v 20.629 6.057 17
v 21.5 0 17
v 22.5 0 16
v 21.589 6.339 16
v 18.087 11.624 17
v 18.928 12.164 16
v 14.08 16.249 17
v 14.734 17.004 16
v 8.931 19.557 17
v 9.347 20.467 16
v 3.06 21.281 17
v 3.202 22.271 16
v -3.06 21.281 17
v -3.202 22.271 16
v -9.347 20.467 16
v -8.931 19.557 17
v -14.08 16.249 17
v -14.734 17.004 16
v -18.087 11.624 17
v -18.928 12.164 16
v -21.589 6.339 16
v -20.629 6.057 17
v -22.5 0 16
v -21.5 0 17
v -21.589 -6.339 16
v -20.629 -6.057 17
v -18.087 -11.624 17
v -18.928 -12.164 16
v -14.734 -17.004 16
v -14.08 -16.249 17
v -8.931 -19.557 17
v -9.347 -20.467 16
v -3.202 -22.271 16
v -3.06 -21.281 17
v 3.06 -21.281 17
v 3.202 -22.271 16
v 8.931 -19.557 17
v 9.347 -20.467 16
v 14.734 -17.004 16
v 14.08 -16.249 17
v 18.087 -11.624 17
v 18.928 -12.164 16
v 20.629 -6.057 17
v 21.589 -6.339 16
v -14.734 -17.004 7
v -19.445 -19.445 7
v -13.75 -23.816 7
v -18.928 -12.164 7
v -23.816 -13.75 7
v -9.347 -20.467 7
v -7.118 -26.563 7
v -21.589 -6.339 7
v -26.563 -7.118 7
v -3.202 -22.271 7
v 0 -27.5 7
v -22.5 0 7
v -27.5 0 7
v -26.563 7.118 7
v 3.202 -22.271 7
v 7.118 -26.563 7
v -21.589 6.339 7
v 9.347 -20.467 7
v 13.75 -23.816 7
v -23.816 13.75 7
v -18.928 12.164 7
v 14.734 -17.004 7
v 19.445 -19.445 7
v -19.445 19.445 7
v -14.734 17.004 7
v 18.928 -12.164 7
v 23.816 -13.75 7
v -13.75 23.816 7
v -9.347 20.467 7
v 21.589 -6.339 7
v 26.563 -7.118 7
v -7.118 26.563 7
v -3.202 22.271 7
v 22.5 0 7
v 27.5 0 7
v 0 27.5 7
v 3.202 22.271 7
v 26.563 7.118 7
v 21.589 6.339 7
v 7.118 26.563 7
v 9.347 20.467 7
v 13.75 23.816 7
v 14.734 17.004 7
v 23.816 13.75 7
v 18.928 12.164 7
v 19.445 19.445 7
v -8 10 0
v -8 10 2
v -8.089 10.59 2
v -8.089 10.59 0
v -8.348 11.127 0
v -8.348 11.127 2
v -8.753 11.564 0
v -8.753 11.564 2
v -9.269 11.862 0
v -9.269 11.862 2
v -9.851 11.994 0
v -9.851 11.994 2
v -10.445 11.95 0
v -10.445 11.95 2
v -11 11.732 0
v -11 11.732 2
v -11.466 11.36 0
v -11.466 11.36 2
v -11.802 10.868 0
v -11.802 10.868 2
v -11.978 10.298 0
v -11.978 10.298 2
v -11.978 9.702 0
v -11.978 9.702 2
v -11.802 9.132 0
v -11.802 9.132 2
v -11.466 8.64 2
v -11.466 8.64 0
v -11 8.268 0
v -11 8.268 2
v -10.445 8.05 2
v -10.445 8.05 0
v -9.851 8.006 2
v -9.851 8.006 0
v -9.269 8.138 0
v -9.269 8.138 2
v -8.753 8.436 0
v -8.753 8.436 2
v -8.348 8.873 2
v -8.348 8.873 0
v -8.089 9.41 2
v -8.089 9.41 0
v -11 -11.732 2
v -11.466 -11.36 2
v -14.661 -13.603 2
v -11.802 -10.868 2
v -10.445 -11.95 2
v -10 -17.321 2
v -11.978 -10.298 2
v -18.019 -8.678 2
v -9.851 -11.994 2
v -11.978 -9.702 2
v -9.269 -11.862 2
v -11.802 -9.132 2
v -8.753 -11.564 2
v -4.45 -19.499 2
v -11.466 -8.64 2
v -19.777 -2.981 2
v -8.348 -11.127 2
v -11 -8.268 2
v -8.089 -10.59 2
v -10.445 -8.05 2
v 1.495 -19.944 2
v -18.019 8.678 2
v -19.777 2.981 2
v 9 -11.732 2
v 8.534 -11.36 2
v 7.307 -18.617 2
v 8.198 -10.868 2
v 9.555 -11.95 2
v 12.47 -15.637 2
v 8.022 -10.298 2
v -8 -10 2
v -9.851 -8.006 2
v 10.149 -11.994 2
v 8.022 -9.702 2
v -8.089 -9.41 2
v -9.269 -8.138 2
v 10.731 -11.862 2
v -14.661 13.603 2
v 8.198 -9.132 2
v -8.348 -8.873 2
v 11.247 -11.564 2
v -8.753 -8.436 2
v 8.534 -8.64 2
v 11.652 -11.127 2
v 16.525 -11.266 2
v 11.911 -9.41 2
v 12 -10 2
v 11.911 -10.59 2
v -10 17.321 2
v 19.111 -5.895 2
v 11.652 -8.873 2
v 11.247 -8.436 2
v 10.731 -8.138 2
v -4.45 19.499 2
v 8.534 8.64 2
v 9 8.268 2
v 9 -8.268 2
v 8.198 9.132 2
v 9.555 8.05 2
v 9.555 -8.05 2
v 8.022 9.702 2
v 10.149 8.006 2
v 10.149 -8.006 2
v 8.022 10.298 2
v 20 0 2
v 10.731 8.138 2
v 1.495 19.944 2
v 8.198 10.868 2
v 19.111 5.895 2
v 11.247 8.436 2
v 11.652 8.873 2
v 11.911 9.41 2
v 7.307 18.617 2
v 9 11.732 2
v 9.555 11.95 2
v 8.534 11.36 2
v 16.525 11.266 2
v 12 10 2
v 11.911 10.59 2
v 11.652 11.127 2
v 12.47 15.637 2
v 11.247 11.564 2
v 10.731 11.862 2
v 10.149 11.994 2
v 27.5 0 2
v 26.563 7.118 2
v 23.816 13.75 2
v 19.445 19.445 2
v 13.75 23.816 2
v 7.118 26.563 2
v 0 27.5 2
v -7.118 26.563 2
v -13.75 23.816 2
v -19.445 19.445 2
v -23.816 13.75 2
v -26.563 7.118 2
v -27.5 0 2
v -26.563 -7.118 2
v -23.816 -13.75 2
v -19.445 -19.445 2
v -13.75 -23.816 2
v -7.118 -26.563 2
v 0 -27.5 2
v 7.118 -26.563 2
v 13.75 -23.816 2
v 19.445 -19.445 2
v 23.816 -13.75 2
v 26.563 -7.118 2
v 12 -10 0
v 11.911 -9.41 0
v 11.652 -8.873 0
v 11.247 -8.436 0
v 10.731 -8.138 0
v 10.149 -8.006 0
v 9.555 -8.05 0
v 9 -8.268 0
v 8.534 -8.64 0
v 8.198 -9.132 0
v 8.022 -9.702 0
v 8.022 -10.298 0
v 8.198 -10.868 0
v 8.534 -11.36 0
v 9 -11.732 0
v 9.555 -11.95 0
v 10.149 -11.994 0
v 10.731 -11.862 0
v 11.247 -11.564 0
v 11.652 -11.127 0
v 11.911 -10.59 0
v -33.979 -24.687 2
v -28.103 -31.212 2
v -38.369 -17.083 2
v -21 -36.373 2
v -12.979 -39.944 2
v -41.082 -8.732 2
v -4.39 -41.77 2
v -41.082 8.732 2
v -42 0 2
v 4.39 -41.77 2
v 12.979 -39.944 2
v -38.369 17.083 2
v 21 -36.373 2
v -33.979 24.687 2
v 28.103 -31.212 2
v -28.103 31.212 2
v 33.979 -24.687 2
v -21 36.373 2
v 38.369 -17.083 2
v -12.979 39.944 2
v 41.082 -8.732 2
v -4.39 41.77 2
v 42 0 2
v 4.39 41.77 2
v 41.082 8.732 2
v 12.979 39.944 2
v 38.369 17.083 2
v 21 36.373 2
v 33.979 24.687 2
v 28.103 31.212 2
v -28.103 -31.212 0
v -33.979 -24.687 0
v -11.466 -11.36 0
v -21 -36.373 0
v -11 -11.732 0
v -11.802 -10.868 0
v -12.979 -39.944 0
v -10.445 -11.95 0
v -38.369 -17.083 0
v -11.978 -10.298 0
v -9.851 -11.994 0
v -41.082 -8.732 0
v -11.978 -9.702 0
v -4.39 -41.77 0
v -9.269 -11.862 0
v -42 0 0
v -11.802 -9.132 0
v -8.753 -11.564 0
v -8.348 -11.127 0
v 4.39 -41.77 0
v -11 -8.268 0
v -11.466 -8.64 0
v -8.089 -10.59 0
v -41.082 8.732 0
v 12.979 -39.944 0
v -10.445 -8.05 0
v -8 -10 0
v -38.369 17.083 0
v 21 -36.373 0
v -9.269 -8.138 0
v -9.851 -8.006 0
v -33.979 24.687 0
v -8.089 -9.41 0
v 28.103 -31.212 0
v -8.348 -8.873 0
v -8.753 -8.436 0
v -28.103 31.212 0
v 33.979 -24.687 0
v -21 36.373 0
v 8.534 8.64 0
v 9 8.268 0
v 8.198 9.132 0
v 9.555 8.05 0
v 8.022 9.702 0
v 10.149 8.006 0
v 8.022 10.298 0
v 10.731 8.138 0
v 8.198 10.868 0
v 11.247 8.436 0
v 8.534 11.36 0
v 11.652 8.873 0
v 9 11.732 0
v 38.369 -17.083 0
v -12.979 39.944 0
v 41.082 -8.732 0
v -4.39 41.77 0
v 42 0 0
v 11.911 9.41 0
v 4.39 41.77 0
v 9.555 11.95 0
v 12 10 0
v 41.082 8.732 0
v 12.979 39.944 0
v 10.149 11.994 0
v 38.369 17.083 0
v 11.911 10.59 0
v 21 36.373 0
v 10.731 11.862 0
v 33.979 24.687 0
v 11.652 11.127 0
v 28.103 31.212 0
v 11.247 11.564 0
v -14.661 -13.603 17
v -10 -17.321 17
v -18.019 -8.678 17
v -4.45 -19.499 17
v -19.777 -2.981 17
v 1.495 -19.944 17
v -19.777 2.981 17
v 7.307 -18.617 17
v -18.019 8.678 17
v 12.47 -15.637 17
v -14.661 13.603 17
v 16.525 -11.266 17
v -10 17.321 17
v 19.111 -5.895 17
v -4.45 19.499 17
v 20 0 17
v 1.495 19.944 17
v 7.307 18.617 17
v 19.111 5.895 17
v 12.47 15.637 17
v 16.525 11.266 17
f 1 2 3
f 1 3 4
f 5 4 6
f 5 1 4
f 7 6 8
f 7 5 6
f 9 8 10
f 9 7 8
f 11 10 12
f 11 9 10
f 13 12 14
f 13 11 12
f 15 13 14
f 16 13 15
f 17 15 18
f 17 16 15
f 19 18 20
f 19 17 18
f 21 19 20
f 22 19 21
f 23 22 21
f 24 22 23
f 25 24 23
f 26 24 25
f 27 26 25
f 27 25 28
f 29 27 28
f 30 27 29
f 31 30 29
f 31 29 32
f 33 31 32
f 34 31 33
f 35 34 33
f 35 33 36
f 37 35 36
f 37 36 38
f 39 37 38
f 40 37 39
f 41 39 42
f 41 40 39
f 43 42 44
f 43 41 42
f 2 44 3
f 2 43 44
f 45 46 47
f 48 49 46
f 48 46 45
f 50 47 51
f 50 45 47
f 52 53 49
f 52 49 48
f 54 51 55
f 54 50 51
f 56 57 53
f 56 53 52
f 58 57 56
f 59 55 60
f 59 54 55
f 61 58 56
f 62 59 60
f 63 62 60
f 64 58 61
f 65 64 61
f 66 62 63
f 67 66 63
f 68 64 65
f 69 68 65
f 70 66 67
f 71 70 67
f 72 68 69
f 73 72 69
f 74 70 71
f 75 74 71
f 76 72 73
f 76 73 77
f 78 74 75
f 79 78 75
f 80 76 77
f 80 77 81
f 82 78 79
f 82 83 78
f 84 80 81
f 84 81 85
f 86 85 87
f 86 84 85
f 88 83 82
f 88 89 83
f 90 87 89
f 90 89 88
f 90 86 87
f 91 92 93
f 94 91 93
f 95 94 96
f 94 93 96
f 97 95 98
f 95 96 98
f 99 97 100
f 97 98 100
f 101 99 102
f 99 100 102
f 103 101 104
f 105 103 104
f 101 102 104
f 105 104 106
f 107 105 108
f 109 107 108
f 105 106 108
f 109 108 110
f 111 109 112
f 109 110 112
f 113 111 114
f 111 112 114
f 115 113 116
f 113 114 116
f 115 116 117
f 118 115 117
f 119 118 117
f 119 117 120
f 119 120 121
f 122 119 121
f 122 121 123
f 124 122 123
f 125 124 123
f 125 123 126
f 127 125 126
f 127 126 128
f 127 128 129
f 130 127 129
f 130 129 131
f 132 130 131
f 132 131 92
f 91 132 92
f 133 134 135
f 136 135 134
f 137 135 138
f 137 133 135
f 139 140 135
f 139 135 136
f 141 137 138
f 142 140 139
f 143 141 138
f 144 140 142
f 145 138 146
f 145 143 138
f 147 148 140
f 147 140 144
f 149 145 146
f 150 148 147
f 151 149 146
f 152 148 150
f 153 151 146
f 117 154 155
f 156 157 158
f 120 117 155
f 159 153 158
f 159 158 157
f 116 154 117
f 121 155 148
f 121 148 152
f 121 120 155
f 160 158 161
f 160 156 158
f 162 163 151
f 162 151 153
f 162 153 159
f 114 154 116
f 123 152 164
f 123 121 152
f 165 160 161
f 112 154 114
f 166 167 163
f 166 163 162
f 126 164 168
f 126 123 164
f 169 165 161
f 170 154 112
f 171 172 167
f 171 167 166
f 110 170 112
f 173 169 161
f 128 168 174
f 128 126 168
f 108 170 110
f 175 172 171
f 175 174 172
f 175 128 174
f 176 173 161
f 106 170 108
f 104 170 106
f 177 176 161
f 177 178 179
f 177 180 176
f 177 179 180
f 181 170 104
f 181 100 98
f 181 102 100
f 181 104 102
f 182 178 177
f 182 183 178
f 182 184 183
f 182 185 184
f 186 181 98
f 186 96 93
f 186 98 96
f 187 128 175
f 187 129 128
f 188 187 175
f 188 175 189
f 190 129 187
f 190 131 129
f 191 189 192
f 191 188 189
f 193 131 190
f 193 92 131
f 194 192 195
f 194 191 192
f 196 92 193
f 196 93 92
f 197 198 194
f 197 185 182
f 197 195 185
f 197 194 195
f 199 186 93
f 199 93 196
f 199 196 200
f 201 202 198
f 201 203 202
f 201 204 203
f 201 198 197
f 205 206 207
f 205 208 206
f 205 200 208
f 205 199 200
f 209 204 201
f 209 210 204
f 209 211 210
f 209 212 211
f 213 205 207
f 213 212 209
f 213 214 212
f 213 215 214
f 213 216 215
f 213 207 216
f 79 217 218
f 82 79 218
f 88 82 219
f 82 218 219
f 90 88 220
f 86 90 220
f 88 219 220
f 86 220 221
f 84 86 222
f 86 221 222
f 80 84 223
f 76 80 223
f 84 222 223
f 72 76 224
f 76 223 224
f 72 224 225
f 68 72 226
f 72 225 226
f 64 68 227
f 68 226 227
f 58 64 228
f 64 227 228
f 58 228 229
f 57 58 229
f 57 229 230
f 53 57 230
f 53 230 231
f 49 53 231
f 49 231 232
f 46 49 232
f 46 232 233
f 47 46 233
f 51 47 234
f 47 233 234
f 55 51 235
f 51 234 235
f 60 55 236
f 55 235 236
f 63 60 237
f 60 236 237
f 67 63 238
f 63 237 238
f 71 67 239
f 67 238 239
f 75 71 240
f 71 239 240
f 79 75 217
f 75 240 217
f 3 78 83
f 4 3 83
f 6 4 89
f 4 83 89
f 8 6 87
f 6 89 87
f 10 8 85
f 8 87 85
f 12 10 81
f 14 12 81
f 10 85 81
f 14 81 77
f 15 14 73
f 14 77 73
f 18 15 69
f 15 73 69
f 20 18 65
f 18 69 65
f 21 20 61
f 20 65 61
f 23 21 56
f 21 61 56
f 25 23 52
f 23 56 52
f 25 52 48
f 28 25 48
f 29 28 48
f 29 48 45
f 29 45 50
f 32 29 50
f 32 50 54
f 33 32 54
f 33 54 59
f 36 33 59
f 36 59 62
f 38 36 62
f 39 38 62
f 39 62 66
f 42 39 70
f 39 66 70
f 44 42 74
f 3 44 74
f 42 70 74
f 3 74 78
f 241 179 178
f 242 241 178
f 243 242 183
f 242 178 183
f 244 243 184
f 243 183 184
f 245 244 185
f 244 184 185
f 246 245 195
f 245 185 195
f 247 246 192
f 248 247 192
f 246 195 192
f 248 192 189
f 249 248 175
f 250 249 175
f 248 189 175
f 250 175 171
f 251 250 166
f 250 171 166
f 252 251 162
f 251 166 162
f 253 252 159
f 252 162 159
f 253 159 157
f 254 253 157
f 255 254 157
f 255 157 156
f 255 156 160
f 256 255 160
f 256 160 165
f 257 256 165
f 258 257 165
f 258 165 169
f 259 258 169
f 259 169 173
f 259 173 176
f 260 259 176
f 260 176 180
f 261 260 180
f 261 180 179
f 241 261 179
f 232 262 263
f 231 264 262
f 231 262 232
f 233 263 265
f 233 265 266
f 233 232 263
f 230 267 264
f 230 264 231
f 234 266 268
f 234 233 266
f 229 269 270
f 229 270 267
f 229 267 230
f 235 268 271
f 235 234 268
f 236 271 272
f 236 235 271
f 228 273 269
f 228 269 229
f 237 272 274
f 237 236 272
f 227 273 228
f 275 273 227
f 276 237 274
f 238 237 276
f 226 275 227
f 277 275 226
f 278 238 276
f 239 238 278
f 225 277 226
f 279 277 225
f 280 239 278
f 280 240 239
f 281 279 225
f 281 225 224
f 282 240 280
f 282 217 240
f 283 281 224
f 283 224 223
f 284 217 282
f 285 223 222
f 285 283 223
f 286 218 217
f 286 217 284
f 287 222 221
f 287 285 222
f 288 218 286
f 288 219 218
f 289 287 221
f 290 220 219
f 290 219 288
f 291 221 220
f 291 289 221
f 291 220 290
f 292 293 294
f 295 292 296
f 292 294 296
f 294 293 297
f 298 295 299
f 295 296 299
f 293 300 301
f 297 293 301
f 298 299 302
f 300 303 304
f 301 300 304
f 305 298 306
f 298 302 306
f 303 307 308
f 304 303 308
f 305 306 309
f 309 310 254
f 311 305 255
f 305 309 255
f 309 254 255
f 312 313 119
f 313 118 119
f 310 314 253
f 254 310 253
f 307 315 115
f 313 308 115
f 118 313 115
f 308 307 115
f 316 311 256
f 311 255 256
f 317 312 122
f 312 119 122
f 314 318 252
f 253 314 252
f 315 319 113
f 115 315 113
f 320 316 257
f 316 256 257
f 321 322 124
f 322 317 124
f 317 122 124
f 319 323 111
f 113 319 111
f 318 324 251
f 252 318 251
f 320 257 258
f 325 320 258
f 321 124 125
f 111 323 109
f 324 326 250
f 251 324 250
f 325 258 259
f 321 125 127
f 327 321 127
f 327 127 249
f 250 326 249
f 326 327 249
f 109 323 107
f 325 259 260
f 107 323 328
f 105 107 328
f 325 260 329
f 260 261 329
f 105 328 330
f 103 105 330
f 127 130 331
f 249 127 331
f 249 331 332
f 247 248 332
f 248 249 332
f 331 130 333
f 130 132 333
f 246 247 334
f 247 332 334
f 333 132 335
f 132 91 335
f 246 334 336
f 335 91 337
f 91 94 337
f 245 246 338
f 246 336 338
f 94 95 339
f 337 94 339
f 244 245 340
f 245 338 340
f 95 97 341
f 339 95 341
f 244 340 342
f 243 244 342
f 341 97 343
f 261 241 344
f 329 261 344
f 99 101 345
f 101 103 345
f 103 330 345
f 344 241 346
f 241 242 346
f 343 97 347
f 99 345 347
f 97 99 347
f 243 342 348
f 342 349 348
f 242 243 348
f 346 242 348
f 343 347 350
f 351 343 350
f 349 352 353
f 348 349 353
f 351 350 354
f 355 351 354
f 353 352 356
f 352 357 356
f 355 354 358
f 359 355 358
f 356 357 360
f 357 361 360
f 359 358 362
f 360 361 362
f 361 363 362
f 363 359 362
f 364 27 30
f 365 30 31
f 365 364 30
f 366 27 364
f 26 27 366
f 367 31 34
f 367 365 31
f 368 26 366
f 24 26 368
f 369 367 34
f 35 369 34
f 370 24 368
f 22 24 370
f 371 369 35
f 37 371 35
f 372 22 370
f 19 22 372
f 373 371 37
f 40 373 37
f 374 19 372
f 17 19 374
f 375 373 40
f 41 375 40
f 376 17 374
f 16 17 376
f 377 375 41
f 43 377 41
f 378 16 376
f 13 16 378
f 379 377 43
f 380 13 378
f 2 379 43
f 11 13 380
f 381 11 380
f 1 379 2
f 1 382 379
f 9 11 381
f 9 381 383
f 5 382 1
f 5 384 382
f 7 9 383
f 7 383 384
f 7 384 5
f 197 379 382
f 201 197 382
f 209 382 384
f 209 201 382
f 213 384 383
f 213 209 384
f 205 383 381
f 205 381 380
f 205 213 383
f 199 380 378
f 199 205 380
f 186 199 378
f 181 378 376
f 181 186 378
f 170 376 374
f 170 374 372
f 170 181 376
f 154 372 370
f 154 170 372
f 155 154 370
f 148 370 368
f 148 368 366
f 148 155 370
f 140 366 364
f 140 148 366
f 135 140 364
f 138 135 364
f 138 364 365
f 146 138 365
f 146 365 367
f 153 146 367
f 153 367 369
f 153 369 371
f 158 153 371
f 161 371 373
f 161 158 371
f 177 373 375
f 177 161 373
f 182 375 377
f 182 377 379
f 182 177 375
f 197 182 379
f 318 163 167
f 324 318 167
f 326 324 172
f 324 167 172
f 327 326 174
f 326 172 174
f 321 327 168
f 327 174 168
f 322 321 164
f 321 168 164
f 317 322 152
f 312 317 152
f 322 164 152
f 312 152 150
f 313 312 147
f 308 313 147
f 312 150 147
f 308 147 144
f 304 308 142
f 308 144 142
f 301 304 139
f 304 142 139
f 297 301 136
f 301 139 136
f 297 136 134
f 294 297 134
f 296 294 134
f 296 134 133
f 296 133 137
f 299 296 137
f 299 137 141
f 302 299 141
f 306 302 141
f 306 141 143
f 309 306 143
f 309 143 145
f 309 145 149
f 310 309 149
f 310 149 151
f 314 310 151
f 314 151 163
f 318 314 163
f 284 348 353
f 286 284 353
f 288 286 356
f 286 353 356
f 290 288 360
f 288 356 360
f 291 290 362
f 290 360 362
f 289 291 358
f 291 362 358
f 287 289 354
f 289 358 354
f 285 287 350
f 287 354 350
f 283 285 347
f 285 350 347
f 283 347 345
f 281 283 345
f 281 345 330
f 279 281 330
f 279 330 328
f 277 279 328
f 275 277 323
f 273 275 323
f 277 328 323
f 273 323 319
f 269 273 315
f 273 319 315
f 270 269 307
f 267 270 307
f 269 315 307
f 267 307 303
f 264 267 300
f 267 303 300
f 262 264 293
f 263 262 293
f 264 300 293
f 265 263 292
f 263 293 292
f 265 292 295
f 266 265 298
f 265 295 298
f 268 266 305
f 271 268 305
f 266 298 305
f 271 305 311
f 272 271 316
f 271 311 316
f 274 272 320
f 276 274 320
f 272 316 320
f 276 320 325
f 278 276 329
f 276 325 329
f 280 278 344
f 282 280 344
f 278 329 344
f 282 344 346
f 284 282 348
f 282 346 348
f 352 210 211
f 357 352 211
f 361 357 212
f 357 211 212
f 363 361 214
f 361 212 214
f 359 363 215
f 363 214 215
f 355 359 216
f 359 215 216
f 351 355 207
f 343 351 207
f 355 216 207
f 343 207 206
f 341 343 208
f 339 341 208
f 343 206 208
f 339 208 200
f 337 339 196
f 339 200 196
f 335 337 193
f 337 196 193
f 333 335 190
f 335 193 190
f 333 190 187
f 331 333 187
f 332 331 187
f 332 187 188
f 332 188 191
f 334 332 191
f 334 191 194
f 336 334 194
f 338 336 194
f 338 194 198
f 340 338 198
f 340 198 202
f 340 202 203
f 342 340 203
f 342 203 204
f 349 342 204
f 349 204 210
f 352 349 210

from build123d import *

# Parameters (mm, degrees)
SKETCH_R      = 42
PAD_DEPTH     = 2
SKETCH001_R   = 27.5
SKETCH001_R_2 = 20
PAD001_DEPTH  = 5
SKETCH002_R   = 22.5
SKETCH002_R_2 = 20
PAD002_DEPTH  = 10
CHAMFER_SIZE  = 1
SKETCH003_R   = 2
POCKET_DEPTH  = 2.001


with BuildPart() as part:
    # Sketch → Pad (new body)
    with BuildSketch(Plane.XY):
        Circle(SKETCH_R)
    extrude(amount=PAD_DEPTH)

    # Sketch001 (on Face3 of Pad) → Pad001 (join)
    with BuildSketch(Plane.XY.offset(2)):
        Circle(SKETCH001_R)
        Circle(SKETCH001_R_2, mode=Mode.SUBTRACT)
    extrude(amount=PAD001_DEPTH)

    # Sketch002 (on Face5 of Pad001) → Pad002 (join)
    with BuildSketch(Plane.XY.offset(7)):
        Circle(SKETCH002_R)
        Circle(SKETCH002_R_2, mode=Mode.SUBTRACT)
    extrude(amount=PAD002_DEPTH)

    # Chamfer
    chamfer_edges = [part.edges().sort_by_distance(p)[0] for p in [
        (-22.5, 0, 17),
    ]]
    chamfer(chamfer_edges, length=CHAMFER_SIZE)

    # Sketch003 (on Face10 of Chamfer) → Pocket (cut, through all)
    with BuildSketch(Plane.XY.offset(2)):
        with Locations((-10, 10)):
            Circle(SKETCH003_R)
        with Locations((10, 10)):
            Circle(SKETCH003_R)
        with Locations((10, -10)):
            Circle(SKETCH003_R)
        with Locations((-10, -10)):
            Circle(SKETCH003_R)
    extrude(amount=-POCKET_DEPTH, mode=Mode.SUBTRACT)


solid = part.part
